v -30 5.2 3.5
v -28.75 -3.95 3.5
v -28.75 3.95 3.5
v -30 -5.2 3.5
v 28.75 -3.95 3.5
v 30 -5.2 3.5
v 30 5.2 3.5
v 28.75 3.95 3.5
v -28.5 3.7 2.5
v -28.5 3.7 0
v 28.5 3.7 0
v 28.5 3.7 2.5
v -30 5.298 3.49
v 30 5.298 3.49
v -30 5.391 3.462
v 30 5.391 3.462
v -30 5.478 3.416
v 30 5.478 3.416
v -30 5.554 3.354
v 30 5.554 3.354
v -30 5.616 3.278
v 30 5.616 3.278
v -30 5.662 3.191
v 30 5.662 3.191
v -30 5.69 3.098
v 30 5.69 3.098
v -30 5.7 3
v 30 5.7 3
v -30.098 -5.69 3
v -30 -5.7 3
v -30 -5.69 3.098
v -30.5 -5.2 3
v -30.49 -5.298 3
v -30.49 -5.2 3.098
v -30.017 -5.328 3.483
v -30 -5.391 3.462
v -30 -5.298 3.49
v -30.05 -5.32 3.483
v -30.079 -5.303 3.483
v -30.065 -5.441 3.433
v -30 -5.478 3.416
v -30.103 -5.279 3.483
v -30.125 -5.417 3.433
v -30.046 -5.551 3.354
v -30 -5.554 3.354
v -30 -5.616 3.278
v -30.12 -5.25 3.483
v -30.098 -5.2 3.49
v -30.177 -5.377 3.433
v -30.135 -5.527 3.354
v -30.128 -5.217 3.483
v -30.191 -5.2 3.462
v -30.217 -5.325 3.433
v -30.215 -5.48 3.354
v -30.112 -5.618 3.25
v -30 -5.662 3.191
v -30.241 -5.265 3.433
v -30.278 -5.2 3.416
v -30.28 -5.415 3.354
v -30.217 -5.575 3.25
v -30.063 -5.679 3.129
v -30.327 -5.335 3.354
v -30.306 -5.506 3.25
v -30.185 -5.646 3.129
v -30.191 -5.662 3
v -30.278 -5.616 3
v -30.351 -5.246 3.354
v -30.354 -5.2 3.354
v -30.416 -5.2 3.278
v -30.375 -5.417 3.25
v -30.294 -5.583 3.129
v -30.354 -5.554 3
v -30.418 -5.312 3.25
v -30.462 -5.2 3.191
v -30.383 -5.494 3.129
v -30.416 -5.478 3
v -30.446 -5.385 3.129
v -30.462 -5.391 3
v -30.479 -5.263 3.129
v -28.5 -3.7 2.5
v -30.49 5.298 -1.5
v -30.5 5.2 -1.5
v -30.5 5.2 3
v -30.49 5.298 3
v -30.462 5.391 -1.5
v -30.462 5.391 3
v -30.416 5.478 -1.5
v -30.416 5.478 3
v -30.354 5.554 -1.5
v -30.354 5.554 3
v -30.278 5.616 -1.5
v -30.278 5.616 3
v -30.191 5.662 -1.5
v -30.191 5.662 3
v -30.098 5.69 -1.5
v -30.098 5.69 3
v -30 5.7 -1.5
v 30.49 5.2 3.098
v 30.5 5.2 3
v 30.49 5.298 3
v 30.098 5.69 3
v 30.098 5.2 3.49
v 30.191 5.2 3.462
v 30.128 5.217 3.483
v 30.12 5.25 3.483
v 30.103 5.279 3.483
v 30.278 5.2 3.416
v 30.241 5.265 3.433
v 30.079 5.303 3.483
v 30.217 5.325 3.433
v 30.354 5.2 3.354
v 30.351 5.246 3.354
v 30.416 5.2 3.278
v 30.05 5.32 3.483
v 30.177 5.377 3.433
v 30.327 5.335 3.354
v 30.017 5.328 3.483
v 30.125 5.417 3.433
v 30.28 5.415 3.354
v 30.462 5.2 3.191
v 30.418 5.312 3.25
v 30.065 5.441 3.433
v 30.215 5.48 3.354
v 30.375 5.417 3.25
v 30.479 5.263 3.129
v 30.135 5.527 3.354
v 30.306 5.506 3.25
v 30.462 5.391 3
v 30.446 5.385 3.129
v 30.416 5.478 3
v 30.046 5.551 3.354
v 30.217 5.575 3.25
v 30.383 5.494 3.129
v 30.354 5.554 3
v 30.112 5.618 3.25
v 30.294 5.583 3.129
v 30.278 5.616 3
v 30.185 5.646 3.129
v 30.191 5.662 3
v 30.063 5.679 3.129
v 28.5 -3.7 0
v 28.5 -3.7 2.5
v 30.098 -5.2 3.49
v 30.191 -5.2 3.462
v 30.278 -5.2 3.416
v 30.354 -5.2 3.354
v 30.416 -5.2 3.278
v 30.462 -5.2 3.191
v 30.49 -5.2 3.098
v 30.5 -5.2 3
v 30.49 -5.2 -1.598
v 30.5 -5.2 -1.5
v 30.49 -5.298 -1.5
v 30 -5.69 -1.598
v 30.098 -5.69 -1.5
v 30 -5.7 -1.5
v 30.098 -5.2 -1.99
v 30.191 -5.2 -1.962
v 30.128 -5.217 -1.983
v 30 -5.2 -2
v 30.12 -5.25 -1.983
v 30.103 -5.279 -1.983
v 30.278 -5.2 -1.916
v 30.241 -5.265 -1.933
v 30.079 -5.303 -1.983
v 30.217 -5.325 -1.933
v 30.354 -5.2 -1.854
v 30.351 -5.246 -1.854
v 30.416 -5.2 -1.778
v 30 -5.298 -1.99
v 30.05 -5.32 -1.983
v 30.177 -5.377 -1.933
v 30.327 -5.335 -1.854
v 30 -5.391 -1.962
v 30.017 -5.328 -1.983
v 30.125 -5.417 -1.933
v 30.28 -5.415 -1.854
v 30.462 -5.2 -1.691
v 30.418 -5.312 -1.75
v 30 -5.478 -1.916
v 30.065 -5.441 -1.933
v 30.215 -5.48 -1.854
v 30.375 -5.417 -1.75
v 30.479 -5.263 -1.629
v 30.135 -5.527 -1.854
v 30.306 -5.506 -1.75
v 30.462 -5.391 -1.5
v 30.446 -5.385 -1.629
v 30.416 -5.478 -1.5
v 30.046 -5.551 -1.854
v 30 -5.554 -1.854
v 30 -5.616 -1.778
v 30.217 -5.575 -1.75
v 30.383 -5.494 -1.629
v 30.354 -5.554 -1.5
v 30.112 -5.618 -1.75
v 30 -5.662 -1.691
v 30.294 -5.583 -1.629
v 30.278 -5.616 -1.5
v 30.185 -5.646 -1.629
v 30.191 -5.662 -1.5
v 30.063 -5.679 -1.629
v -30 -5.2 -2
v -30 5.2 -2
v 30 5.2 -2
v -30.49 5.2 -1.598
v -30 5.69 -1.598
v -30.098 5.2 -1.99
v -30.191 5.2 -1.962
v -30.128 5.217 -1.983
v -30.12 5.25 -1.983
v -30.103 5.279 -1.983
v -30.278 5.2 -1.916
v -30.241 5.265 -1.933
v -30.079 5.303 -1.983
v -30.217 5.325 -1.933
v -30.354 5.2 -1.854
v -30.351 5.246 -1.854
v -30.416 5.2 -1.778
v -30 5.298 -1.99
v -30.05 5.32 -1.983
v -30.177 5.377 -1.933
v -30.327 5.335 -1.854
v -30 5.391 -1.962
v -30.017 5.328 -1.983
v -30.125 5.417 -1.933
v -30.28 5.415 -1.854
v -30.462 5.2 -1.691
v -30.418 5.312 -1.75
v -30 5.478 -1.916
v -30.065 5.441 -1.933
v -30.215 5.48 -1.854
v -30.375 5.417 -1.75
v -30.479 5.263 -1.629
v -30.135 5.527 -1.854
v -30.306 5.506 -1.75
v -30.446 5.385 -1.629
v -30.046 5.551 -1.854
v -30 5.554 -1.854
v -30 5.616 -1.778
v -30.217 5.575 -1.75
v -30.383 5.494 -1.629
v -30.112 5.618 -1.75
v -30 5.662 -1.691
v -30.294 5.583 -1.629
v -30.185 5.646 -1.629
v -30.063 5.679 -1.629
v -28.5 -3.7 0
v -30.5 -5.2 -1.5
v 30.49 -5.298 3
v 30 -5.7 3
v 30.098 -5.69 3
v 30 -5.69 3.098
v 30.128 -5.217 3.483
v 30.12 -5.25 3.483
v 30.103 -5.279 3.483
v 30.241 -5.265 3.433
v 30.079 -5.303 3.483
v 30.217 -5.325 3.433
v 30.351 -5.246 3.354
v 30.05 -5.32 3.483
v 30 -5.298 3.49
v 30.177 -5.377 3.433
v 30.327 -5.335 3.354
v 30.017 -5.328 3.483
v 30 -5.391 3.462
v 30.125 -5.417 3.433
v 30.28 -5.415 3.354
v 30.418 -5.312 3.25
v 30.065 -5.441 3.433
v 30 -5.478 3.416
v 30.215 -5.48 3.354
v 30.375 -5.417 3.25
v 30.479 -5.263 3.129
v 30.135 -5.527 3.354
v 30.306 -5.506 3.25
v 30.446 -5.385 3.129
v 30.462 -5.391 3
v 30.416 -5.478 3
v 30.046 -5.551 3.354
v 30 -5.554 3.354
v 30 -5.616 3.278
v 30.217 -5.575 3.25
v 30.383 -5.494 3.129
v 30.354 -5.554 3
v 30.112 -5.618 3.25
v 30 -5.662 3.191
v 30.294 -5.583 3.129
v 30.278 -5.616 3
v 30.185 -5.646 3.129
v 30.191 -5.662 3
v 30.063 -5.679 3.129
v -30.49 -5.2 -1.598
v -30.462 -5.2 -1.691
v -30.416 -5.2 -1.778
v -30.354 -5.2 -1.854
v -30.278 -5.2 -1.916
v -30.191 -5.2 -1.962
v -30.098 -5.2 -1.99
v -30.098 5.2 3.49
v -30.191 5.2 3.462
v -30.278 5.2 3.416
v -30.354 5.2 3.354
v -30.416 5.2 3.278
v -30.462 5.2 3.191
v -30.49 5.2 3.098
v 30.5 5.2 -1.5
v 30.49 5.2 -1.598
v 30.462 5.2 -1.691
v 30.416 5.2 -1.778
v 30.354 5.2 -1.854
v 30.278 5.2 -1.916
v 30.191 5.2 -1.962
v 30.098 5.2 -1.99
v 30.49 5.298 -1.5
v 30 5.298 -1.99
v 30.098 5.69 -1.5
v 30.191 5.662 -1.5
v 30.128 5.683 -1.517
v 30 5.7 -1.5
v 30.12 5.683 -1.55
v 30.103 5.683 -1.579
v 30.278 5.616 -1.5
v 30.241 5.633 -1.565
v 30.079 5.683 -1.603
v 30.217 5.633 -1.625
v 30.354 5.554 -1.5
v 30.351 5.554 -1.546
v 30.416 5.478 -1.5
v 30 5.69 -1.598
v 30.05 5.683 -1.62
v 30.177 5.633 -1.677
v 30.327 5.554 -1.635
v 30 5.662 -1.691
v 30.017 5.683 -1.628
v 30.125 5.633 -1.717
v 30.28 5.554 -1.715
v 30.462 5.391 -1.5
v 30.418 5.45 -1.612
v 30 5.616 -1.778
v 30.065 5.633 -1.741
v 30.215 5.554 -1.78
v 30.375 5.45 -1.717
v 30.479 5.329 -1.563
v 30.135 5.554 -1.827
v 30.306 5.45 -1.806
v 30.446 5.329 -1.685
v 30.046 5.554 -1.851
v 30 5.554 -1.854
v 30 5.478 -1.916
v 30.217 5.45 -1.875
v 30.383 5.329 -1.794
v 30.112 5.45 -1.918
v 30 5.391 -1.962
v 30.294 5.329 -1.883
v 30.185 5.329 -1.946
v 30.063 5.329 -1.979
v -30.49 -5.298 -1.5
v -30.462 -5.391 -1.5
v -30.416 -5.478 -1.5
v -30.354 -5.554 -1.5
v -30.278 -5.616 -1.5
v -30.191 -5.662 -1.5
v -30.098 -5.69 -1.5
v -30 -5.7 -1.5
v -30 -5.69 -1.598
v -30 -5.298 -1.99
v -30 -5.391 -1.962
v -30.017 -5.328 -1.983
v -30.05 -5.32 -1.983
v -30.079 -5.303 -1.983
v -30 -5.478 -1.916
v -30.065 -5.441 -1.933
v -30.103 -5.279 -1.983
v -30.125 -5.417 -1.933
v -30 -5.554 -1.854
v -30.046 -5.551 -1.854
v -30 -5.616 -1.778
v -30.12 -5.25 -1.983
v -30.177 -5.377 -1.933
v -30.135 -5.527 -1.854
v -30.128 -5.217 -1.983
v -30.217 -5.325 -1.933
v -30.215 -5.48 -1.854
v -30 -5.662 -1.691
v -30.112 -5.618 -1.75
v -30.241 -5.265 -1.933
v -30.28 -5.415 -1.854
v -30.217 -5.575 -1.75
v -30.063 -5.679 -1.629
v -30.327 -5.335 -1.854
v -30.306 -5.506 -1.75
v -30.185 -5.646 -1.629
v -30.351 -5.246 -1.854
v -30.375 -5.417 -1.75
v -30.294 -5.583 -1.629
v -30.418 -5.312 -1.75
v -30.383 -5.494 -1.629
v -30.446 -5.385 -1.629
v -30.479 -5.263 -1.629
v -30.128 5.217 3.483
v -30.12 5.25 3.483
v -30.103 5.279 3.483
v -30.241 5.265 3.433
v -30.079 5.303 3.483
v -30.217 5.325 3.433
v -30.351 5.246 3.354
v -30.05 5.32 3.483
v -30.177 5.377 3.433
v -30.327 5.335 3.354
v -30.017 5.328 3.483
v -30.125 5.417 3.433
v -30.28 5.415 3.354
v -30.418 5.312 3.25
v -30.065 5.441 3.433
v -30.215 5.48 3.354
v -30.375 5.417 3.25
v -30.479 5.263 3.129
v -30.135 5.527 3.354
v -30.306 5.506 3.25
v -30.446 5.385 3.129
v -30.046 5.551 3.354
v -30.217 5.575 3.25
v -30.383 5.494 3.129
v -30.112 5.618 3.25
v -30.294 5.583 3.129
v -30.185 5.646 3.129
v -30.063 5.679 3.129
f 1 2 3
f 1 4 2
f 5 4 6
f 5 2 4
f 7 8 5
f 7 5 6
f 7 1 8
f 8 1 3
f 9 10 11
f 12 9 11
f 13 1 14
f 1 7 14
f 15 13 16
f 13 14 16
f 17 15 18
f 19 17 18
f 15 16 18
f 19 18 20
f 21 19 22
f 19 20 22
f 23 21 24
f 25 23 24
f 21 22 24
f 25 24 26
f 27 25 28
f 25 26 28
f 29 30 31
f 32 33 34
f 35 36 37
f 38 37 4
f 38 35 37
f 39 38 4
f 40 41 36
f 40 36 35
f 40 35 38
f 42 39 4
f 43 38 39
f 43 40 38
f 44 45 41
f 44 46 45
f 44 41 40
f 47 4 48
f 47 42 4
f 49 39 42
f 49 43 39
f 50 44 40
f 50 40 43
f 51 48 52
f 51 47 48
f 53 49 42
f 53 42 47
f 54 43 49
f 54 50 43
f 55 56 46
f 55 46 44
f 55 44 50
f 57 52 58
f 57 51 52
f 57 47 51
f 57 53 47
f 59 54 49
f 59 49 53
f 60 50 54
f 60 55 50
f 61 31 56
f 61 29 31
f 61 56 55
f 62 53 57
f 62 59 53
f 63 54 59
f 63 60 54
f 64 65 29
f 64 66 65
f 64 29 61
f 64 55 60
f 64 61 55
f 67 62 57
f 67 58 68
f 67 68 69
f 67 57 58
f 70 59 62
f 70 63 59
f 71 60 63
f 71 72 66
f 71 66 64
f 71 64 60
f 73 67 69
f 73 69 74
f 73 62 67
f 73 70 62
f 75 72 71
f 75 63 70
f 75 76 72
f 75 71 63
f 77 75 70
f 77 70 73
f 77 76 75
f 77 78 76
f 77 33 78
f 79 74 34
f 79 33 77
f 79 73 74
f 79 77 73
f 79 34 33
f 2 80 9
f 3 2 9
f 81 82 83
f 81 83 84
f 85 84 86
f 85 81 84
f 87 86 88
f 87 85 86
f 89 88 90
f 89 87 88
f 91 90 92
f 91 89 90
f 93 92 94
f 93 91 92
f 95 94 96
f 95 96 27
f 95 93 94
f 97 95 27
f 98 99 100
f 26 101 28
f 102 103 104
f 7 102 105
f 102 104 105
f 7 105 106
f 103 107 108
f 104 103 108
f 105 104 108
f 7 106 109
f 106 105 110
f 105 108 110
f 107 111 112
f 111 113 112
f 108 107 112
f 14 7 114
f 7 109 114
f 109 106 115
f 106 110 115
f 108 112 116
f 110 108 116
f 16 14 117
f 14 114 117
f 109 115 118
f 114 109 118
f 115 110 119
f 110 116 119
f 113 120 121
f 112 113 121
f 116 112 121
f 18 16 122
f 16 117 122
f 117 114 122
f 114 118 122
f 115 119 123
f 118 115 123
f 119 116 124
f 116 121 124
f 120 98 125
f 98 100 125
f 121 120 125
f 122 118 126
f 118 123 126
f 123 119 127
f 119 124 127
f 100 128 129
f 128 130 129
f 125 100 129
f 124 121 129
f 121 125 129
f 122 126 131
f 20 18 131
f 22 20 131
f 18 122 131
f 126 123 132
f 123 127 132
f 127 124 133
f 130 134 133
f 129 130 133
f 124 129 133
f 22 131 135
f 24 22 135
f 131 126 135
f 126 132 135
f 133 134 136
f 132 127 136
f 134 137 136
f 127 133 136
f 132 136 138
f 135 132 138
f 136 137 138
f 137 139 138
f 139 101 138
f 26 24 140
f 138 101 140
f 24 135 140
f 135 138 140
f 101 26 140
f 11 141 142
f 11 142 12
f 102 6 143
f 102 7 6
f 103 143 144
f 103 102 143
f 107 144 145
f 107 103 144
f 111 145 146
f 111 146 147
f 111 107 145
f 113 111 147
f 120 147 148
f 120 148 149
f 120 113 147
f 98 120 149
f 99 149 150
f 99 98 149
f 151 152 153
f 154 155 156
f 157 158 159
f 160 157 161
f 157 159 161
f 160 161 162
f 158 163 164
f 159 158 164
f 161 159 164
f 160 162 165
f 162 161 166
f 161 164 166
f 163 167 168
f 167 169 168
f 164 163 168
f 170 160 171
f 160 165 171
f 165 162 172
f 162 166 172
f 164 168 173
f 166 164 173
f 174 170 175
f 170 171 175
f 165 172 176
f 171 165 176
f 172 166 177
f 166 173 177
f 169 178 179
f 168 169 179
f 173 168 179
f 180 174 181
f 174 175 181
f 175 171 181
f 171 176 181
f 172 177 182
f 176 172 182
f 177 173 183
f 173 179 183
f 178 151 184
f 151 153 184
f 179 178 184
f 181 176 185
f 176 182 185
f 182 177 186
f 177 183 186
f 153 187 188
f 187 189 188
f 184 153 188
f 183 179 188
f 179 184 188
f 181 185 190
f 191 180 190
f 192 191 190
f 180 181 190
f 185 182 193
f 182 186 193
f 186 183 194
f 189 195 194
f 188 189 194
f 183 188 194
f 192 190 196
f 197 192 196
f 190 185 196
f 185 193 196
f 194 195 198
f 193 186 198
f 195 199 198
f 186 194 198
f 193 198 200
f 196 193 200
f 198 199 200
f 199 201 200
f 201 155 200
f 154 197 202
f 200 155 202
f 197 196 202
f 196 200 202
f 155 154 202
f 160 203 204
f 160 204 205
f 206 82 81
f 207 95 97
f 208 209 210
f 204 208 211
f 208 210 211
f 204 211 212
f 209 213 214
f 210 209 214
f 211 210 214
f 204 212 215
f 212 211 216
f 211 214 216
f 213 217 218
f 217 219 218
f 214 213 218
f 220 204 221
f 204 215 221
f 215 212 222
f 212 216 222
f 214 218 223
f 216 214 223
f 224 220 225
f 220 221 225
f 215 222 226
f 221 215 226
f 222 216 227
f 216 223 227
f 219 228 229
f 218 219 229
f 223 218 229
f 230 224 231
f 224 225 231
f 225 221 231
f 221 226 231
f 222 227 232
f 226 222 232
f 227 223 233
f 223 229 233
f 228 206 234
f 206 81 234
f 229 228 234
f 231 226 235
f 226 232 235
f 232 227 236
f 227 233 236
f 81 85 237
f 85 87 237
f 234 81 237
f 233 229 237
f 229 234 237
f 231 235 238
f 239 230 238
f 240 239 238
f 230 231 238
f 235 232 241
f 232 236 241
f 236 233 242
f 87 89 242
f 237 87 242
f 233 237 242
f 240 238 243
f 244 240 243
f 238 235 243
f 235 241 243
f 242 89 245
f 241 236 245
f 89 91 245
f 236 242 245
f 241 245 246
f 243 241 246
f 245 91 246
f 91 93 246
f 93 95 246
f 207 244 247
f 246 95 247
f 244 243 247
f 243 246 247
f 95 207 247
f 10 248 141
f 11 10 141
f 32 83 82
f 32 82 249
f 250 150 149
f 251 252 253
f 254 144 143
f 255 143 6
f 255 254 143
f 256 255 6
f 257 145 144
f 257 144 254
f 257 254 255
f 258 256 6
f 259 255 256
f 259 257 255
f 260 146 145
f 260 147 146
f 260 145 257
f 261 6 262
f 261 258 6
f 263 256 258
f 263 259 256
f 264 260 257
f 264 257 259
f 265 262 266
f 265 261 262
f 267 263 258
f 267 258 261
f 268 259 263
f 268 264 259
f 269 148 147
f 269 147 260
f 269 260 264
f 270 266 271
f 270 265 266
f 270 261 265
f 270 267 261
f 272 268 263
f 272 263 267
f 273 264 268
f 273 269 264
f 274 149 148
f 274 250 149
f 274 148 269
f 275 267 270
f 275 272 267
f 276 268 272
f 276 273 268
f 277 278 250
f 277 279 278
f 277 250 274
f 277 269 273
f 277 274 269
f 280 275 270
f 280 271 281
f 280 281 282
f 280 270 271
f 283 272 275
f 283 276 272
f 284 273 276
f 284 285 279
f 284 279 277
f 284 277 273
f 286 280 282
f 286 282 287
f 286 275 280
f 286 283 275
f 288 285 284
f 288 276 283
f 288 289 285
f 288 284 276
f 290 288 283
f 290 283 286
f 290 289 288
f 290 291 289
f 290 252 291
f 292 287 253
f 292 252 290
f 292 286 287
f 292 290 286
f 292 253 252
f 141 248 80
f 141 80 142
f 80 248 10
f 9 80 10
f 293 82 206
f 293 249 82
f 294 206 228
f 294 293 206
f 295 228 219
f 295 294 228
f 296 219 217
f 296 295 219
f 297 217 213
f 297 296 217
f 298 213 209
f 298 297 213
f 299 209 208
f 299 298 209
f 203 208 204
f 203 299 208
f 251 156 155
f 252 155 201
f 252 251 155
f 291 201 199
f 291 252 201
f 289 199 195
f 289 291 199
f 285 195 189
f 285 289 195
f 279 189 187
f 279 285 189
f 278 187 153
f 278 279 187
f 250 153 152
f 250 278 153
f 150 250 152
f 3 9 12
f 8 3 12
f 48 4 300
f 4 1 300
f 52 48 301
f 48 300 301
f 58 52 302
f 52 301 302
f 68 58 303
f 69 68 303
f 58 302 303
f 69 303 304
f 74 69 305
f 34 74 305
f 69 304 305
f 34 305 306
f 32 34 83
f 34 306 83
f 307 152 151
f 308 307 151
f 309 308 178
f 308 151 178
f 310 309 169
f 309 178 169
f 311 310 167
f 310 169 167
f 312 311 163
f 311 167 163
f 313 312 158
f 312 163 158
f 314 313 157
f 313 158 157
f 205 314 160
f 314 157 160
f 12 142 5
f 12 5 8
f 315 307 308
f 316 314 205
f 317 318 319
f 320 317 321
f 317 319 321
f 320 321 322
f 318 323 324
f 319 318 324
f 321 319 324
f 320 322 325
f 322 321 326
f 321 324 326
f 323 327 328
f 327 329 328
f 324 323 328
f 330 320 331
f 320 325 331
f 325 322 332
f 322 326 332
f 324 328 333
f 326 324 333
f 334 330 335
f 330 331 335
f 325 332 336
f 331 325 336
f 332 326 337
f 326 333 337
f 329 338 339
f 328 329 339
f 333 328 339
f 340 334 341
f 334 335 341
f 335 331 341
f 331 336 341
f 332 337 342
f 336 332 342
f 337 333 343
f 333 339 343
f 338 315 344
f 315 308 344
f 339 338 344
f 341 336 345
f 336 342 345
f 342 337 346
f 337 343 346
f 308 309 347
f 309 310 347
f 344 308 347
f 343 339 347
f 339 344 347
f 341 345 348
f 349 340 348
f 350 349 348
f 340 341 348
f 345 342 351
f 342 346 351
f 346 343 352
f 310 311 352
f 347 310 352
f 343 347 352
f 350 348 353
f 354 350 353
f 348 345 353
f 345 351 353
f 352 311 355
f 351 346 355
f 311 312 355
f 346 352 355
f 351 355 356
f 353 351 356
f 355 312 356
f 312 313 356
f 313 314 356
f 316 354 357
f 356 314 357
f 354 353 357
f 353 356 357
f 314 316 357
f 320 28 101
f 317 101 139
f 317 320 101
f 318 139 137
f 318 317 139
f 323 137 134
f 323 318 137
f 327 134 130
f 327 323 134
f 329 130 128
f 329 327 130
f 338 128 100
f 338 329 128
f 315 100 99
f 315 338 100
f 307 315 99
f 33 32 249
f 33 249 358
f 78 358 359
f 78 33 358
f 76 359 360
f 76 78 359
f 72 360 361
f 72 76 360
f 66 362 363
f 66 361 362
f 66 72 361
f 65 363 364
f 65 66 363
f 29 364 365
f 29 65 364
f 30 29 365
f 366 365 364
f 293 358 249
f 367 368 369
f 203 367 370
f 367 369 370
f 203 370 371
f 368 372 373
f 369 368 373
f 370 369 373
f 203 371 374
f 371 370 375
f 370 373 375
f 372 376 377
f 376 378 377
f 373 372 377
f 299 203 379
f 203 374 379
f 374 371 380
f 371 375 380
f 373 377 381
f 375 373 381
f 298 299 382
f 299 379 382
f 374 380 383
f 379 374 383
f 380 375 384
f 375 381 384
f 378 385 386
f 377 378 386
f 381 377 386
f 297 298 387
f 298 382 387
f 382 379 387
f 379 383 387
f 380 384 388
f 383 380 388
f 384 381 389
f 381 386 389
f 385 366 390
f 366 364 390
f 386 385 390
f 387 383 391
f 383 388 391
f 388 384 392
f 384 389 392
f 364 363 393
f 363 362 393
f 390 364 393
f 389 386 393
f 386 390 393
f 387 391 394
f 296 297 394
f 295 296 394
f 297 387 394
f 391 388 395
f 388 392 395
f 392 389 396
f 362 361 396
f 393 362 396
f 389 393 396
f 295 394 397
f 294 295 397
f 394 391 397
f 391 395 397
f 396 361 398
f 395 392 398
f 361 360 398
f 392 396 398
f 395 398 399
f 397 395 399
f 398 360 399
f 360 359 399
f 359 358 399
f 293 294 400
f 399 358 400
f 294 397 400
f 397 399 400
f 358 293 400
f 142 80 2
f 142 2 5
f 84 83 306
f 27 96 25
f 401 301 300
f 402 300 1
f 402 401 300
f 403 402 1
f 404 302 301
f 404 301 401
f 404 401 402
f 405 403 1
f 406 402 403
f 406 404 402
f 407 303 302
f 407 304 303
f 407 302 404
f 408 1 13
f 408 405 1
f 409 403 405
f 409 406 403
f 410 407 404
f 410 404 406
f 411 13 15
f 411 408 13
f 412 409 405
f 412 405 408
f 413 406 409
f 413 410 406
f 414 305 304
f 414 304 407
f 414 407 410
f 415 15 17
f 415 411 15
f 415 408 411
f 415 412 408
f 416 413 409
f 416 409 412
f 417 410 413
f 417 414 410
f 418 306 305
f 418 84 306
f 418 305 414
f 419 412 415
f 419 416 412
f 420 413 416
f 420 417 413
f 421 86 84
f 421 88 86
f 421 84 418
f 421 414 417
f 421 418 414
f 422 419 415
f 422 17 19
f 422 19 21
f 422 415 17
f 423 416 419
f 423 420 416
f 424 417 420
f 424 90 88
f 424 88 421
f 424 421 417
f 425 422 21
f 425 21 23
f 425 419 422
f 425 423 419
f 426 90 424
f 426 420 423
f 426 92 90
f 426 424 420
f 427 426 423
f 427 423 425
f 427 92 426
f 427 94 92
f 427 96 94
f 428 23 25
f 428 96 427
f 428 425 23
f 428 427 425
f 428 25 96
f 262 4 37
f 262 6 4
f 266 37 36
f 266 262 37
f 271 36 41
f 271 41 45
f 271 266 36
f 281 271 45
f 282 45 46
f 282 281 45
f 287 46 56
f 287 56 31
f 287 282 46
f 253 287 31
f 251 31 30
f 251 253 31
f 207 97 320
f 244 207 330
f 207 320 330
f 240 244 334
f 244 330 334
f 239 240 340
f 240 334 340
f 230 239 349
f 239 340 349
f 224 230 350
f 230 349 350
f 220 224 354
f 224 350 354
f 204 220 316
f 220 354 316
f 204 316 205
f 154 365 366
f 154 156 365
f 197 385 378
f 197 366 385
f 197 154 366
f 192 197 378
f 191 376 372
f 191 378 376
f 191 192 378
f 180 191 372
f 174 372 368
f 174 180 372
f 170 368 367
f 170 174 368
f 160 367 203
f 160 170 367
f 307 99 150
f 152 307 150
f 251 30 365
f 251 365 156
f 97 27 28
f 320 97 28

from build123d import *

# Parameters (mm, degrees)
SKETCH002_W      = 61
SKETCH002_H      = 11.4
SKETCH002_W_2    = 57
SKETCH002_H_2    = 7.4
PAD002_DEPTH     = 3.5
SKETCH003_W      = 61
SKETCH003_H      = 11.4
PAD003_DEPTH     = 2
CHAMFER001_SIZE2 = 1
CHAMFER001_SIZE  = 0.25
FILLET_R         = 0.5


with BuildPart() as part:
    # Sketch002 → Pad002 (new body)
    with BuildSketch(Plane.XY):
        Rectangle(SKETCH002_W, SKETCH002_H)
        Rectangle(SKETCH002_W_2, SKETCH002_H_2, mode=Mode.SUBTRACT)
    extrude(amount=PAD002_DEPTH)

    # Sketch003 (on Face9 of Pad002) → Pad003 (join)
    with BuildSketch(Plane(origin=(0, 0, 0), x_dir=(1, 0, 0), z_dir=(0, 0, -1))):
        Rectangle(SKETCH003_W, SKETCH003_H)
    extrude(amount=PAD003_DEPTH)

    # Chamfer001
    chamfer001_edges = [part.edges().sort_by_distance(p)[0] for p in [
        (0, 3.7, 3.5),
        (-28.5, 0, 3.5),
        (0, -3.7, 3.5),
        (28.5, 0, 3.5),
    ]]
    chamfer001_side = part.faces().sort_by_distance((29.879439, 0, 3.5))[0]
    chamfer(chamfer001_edges, length=CHAMFER001_SIZE, length2=CHAMFER001_SIZE2, reference=chamfer001_side)

    # Fillet
    fillet_edges = [part.edges().sort_by_distance(p)[0] for p in [
        (30.5, -5.7, 0.75),
        (30.5, 0, -2),
        (30.5, 5.7, 0.75),
        (30.5, 0, 3.5),
        (-30.5, -5.7, 0.75),
        (0, -5.7, -2),
        (0, -5.7, 3.5),
        (-30.5, 5.7, 0.75),
        (-30.5, 0, -2),
        (-30.5, 0, 3.5),
        (0, 5.7, -2),
        (0, 5.7, 3.5),
    ]]
    fillet(fillet_edges, radius=FILLET_R)


solid = part.part
